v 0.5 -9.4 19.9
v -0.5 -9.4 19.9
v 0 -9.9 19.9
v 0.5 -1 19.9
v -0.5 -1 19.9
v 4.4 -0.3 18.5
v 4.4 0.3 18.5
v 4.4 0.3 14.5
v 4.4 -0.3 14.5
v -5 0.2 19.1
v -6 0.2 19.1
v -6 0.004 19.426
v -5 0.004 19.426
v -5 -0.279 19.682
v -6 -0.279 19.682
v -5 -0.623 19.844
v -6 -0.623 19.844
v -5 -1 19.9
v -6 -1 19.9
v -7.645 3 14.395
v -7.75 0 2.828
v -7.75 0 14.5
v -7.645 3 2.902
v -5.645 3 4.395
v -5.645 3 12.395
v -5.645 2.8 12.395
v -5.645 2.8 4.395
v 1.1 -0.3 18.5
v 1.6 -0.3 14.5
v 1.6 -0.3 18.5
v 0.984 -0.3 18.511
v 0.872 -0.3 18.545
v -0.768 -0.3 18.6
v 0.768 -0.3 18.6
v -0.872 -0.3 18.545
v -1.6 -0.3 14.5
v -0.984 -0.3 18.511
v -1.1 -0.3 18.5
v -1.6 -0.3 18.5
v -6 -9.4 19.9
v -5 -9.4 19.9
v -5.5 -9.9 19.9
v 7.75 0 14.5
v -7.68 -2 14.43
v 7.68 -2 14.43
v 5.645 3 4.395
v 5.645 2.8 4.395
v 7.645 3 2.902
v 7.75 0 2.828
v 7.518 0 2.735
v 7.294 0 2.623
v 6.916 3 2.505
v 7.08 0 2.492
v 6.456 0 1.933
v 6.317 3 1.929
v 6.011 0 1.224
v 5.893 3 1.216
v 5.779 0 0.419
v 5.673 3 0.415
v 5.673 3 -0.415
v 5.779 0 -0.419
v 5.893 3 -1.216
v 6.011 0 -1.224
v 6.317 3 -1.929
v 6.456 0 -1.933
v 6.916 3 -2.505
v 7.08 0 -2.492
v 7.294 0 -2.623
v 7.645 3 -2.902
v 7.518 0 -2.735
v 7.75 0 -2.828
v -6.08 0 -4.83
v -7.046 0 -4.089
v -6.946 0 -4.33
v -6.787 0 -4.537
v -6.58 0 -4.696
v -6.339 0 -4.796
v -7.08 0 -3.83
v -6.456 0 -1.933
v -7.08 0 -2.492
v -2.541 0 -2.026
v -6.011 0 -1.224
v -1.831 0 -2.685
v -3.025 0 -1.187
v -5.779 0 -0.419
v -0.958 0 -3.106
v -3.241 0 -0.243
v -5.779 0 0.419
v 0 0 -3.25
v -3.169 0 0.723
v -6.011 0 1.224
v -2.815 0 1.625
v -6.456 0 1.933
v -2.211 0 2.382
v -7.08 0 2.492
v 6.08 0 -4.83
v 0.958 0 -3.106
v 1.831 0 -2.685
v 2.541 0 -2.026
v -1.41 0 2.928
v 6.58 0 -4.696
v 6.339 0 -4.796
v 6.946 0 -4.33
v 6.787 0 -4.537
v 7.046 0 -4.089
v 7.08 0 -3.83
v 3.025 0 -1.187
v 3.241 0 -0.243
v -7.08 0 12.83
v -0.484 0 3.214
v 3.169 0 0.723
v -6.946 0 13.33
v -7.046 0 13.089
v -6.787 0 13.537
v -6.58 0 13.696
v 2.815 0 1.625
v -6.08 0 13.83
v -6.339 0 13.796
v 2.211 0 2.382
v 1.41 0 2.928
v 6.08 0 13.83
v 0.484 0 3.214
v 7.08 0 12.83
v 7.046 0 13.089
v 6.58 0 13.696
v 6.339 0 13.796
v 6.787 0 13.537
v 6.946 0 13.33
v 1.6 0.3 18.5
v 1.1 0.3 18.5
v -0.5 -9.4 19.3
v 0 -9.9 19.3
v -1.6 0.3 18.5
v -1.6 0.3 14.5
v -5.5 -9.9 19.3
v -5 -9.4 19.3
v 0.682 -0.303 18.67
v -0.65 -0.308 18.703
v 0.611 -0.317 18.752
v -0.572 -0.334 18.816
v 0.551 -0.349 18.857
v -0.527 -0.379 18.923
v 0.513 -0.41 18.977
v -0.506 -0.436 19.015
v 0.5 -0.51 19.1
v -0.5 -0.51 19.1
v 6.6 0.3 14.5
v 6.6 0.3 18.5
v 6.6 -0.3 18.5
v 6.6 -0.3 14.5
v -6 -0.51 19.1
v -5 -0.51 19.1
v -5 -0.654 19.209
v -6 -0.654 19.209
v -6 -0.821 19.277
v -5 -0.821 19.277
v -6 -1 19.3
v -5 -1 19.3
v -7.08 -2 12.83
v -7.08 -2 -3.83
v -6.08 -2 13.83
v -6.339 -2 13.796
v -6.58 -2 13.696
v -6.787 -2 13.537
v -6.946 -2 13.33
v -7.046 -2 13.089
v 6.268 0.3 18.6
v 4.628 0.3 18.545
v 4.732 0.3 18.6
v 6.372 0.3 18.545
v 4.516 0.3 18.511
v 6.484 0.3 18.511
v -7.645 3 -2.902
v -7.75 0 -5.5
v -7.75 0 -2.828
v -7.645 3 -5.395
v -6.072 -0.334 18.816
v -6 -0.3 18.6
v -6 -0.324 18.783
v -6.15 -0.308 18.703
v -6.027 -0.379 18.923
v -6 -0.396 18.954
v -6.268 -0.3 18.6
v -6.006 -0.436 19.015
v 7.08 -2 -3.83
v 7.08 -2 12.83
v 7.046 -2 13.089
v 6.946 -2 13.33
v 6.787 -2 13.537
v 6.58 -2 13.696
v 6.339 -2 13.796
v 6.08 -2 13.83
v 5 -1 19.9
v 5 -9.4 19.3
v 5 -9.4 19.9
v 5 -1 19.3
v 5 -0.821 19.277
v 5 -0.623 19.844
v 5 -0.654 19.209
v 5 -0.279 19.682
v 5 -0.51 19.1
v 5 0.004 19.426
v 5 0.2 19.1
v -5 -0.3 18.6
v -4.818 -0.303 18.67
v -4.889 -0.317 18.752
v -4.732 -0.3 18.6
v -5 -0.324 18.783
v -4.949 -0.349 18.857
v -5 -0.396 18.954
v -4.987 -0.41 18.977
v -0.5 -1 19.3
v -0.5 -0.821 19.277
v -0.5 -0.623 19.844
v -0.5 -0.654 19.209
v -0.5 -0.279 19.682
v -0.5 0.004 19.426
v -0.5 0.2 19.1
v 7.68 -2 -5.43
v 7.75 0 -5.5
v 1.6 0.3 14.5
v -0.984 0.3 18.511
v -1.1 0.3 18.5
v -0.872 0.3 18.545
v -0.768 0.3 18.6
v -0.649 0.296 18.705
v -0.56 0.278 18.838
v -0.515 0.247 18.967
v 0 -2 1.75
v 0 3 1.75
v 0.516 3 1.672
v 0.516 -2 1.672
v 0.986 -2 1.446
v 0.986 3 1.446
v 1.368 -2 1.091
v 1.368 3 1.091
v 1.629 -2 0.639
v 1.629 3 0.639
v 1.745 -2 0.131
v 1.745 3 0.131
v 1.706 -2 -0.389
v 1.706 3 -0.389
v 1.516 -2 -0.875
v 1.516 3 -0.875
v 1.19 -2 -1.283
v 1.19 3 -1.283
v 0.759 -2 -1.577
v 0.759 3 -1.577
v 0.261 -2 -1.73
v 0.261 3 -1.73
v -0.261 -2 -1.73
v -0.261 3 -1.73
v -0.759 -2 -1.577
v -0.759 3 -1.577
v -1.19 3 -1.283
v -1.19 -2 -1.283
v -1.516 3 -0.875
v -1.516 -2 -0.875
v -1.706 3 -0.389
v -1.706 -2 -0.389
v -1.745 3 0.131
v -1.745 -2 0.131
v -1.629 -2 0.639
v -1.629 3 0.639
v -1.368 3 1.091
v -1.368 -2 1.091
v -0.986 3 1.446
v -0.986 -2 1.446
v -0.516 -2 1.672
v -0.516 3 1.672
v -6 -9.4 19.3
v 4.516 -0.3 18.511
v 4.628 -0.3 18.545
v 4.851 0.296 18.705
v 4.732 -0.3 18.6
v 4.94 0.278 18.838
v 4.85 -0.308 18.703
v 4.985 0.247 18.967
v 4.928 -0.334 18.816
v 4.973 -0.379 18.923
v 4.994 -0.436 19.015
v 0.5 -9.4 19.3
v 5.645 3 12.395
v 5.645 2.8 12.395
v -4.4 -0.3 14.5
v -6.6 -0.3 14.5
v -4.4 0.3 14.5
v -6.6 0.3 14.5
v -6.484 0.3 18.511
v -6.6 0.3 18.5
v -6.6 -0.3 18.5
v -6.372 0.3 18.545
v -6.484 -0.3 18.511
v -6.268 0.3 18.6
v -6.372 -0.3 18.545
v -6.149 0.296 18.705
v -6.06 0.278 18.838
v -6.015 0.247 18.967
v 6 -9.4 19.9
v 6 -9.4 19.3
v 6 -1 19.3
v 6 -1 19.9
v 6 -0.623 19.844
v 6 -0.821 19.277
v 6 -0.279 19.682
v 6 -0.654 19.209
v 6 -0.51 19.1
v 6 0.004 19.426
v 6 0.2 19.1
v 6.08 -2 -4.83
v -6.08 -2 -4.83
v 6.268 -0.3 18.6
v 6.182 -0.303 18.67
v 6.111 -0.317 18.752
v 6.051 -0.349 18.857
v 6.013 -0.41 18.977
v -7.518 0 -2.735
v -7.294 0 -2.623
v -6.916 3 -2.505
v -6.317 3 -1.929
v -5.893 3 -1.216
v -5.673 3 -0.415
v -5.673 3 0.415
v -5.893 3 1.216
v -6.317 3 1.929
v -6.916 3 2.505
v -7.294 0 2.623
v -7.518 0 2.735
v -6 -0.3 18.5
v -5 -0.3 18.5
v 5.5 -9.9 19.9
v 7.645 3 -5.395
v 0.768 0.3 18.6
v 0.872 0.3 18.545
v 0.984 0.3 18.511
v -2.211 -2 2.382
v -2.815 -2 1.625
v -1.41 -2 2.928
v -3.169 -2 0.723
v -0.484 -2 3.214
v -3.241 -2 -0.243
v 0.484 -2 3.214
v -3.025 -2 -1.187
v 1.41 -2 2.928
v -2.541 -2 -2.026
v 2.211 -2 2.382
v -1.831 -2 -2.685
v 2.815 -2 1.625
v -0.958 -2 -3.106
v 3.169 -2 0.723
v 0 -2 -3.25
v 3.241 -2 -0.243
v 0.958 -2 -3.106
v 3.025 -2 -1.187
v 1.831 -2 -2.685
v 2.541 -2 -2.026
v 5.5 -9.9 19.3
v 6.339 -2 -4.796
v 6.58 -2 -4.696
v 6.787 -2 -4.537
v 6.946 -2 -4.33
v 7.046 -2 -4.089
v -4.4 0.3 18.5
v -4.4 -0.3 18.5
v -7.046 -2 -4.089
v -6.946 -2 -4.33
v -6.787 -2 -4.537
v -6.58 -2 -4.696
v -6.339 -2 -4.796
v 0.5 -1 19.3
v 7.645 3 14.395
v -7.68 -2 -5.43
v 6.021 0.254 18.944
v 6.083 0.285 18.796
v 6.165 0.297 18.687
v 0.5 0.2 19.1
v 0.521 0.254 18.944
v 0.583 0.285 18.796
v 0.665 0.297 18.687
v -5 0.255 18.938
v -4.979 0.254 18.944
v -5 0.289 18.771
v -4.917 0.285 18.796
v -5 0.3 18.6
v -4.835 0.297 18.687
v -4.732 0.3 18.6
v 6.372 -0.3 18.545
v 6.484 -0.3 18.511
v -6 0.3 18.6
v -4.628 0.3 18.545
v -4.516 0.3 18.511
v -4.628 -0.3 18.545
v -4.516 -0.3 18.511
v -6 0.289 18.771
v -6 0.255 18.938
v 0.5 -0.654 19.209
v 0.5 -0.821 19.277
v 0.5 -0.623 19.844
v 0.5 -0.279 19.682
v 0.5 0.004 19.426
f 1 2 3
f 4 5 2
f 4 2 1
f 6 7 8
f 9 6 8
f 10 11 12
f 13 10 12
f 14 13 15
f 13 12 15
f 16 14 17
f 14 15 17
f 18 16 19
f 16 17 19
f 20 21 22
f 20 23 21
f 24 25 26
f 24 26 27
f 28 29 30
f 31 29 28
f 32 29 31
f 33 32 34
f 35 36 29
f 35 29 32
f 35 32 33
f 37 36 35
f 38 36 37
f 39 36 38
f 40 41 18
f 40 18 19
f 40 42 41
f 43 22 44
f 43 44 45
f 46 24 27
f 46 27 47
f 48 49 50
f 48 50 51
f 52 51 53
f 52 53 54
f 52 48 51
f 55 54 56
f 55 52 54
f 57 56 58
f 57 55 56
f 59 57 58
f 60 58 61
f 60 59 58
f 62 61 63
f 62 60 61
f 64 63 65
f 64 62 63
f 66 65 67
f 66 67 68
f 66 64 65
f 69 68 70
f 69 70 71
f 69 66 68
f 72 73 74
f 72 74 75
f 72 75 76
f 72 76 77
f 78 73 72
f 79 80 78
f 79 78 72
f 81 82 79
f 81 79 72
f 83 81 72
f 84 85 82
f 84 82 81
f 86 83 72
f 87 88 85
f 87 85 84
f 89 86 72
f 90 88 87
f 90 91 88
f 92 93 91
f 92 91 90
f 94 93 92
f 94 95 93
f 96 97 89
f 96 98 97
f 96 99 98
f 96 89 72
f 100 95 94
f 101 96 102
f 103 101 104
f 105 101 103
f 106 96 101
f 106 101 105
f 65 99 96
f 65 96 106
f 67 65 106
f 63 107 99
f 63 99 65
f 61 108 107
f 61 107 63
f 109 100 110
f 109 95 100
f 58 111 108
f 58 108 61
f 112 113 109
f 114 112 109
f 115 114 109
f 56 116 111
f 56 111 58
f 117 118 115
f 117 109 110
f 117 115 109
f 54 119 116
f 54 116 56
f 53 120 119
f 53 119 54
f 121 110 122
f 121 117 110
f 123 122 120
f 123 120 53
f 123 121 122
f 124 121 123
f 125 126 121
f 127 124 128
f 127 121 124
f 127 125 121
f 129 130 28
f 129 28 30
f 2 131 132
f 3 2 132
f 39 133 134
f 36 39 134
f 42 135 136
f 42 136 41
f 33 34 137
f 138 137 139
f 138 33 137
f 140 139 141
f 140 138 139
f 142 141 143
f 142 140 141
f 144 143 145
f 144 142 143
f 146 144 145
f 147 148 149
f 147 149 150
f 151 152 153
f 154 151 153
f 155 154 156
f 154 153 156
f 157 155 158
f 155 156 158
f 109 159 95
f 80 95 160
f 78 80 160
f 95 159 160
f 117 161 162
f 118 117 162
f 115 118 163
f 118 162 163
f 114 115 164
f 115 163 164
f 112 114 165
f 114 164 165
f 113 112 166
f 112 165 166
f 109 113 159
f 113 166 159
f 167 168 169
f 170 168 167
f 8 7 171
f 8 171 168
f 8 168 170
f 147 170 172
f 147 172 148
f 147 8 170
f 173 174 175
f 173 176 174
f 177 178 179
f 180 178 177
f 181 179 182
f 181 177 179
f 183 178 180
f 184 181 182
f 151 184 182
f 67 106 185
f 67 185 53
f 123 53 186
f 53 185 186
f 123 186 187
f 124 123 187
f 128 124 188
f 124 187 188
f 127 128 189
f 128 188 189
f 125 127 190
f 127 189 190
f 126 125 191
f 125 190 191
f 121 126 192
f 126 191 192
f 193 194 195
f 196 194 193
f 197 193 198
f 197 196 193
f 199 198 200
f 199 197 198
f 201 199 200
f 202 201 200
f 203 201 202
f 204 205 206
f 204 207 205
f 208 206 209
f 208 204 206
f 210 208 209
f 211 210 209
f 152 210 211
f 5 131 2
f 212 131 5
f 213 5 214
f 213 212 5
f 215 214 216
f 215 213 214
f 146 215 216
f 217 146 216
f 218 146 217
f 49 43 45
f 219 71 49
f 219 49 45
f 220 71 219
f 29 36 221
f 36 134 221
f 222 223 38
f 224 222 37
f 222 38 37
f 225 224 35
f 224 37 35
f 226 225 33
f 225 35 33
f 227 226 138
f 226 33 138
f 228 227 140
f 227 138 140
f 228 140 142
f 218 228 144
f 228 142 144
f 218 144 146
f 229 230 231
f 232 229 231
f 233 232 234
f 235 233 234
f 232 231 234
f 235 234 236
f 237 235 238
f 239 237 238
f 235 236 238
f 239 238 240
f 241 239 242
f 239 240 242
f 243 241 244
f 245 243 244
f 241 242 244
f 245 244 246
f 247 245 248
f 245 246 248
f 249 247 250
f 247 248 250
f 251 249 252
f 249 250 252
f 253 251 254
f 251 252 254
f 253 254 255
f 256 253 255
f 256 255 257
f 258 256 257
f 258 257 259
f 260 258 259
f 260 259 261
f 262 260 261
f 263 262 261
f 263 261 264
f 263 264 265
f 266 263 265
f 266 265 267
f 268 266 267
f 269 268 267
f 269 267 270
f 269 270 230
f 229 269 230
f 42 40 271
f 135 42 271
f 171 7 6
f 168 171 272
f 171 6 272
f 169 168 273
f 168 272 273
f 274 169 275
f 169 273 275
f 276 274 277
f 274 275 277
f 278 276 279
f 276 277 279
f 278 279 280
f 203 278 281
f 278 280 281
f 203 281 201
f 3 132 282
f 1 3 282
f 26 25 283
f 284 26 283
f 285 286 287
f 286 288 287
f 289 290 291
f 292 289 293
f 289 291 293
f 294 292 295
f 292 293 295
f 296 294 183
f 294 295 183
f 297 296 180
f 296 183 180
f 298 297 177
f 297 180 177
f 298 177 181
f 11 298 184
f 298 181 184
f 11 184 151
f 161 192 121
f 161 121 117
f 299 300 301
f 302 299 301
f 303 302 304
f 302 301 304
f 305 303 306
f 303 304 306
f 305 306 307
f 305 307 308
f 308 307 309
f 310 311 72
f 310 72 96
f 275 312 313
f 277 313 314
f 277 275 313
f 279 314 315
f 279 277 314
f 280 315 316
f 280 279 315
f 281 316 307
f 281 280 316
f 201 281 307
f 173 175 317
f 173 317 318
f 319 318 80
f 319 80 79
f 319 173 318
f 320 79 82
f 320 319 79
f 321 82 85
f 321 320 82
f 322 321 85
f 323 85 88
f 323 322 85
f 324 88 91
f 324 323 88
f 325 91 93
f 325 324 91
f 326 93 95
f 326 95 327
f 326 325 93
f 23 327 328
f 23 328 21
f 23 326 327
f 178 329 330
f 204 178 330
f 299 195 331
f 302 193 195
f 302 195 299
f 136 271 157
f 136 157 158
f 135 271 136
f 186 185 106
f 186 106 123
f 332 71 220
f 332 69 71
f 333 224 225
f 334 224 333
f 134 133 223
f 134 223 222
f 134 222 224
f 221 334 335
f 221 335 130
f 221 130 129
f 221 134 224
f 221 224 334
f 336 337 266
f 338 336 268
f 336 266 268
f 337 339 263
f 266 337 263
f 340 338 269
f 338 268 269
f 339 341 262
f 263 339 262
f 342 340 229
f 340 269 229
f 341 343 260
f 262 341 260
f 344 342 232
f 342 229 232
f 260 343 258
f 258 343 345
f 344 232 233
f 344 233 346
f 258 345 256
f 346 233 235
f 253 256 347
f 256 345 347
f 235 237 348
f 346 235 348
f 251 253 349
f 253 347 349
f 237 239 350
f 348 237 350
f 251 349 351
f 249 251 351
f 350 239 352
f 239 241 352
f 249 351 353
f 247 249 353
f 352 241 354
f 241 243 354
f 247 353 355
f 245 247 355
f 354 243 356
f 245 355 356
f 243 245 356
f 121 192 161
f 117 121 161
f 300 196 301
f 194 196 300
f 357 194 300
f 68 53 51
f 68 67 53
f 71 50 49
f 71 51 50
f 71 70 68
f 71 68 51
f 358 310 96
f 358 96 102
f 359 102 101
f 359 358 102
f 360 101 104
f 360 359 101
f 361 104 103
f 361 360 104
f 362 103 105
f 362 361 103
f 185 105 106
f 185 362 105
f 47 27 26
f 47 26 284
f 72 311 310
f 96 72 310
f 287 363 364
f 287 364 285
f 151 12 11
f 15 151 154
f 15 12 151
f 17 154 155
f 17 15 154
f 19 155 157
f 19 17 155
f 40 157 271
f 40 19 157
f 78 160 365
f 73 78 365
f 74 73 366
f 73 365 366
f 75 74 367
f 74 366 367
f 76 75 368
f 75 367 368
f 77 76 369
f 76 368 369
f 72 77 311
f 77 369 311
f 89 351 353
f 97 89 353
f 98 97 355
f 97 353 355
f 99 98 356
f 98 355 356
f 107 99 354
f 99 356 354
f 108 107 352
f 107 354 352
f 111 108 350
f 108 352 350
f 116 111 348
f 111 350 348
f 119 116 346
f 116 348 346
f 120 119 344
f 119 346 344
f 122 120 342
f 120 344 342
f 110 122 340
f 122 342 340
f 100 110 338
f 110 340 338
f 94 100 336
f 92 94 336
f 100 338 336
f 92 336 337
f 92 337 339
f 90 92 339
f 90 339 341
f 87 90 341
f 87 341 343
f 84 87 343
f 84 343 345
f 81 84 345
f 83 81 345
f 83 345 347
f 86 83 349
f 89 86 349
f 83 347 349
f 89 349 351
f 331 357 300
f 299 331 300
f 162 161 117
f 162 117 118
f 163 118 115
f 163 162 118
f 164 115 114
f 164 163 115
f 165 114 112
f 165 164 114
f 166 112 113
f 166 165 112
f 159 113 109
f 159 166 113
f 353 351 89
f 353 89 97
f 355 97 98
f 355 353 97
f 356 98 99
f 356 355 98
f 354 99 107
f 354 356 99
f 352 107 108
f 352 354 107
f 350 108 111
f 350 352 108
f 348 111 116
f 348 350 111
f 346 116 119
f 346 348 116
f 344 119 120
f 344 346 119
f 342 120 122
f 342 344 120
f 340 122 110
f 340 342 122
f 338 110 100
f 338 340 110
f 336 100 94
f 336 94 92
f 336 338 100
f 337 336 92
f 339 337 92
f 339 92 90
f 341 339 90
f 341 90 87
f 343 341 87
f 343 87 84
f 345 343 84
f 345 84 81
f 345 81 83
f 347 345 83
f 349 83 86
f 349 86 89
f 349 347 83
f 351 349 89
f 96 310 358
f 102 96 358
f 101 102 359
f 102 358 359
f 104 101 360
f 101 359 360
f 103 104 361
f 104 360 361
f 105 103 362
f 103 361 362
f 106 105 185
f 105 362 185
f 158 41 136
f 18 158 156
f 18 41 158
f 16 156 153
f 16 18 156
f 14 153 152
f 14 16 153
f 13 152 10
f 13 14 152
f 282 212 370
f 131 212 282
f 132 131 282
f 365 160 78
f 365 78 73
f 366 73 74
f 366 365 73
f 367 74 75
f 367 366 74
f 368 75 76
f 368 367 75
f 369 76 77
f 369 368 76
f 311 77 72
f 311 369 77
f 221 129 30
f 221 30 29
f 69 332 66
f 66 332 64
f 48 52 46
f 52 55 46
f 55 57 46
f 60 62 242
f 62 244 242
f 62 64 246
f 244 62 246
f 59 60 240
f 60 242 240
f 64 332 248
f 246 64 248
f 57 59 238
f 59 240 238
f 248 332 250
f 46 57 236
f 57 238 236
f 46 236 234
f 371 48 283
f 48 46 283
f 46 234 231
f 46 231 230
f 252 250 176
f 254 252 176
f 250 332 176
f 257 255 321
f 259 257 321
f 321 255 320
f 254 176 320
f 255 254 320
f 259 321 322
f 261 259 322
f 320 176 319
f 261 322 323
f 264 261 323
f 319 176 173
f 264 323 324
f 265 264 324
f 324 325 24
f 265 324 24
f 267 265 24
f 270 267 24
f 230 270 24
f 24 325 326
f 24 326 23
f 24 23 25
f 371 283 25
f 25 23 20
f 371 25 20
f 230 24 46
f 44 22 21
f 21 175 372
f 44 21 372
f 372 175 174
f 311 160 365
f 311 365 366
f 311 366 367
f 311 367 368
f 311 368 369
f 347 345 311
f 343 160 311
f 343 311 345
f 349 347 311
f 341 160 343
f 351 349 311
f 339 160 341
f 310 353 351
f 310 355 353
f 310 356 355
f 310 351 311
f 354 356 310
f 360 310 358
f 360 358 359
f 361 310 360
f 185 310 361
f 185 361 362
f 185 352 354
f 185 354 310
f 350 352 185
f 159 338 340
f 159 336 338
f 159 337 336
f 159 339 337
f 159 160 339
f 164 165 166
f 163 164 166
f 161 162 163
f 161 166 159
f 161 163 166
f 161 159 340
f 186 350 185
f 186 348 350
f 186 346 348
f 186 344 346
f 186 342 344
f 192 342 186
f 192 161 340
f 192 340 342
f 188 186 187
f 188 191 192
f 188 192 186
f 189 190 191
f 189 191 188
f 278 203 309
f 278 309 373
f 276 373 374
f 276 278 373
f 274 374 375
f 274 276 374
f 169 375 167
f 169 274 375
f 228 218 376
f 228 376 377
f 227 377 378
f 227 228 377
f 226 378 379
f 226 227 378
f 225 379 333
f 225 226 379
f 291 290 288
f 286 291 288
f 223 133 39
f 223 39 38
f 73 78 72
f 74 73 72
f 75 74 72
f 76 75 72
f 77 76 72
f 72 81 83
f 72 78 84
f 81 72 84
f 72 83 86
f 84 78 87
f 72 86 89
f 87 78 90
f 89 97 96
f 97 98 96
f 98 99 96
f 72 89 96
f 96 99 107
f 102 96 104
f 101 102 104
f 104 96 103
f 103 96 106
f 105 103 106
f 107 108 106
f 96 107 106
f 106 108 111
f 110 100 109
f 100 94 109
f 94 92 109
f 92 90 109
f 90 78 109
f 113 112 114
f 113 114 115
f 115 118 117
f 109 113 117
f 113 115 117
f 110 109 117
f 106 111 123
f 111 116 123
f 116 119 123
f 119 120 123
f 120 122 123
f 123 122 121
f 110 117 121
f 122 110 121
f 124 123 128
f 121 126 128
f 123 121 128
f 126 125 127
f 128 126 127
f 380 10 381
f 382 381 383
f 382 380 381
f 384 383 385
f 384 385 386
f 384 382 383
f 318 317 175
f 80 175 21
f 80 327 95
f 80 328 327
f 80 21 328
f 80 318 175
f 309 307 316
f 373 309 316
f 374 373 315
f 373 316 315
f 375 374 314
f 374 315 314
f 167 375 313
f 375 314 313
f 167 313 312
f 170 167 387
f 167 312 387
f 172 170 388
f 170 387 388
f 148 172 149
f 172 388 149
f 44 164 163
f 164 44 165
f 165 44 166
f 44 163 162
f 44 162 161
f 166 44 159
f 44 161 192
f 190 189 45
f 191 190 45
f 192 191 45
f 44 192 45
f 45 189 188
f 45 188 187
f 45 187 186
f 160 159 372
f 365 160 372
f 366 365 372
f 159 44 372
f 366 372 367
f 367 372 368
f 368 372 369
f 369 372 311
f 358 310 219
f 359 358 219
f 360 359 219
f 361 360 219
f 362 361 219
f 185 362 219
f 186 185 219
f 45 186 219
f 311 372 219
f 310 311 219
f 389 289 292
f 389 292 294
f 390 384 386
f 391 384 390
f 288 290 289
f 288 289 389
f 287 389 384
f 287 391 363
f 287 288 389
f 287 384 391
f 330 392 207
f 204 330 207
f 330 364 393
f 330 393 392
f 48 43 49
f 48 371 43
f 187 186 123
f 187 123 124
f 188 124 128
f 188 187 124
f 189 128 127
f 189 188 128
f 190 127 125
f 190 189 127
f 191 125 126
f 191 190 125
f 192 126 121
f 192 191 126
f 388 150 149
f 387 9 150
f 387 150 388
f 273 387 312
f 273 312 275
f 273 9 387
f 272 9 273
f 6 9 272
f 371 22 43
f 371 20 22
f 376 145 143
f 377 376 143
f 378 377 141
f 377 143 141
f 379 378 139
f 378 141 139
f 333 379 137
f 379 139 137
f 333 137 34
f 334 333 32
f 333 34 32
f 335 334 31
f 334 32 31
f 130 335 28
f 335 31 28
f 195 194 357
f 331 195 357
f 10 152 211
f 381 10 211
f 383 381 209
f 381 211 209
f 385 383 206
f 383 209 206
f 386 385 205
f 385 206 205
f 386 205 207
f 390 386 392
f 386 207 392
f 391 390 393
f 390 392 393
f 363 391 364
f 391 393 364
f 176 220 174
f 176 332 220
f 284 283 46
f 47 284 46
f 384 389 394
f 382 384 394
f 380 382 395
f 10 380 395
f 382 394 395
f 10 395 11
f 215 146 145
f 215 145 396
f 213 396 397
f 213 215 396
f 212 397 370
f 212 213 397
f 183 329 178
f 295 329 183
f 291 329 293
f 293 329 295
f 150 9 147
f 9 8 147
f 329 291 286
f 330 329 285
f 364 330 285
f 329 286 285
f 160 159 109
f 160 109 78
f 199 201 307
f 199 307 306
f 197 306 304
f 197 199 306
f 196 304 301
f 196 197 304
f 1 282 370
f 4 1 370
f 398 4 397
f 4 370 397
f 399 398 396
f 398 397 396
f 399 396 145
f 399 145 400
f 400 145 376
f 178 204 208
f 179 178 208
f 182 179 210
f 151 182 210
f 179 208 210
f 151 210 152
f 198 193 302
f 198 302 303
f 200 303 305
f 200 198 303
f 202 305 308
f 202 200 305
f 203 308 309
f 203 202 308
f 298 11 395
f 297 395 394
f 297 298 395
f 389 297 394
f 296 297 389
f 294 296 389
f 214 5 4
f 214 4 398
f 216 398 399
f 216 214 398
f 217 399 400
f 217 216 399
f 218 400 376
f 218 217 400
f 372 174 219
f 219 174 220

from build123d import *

# Parameters (mm, degrees)
SKETCH1_W             = 15.5
SKETCH1_H             = 20
EXTRUDE1_DEPTH        = 2
EXTRUDE1_DRAFT        = -2
EXTRUDE2_DEPTH        = 3
EXTRUDE2_TAPER        = 2
SKETCH3_R             = 1.75
EXTRUDE3_DEPTH        = 18.184658986
SKETCH4_W             = 2.2
SKETCH4_H             = 4
EXTRUDE4_DEPTH        = 0.3
SKETCH4_W_2           = 3.2
EXTRUDE4_2_DEPTH      = 0.3
EXTRUDE4_3_DEPTH      = 0.3
SKETCH5_W             = 11.290475384
SKETCH5_H             = 8
EXTRUDE5_DEPTH        = 0.2
SKETCH6_W             = 1
SKETCH6_H             = 0.6
CHAMFER1_SIZE         = 0.5
LPATTERN1_START       = 18.6
LPATTERN1_DEPTH       = 1.3
LPATTERN1_START_2     = 18.5
LPATTERN1_2_OUTLINE_W = 1
LPATTERN1_2_OUTLINE_H = 0.6
LPATTERN1_2_DEPTH     = 0.8
LPATTERN1_START_3     = 5
LPATTERN1_3_DEPTH     = 1
LPATTERN1_4_DEPTH     = 1.3
LPATTERN1_5_OUTLINE_W = 1
LPATTERN1_5_OUTLINE_H = 0.6
LPATTERN1_5_DEPTH     = 0.8
LPATTERN1_START_4     = -0.5
LPATTERN1_6_DEPTH     = 1
FILLET1_START         = -0.510102151
FILLET1_DEPTH         = 0.810102151
FILLET1_START_2       = -8
FILLET1_2_DEPTH       = 5
FILLET2_START         = -0.510102151
FILLET2_DEPTH         = 0.810102151
FILLET2_START_2       = -2
FILLET2_2_DEPTH       = 4
FILLET3_START         = -0.510102151
FILLET3_DEPTH         = 0.810102151
FILLET3_START_2       = 3
FILLET3_2_DEPTH       = 5
SKETCH7_R             = 3.25
CUT_EXTRUDE1_DEPTH    = 2
SKETCH8_R             = 3.25
EXTRUDE7_DEPTH        = 2


with BuildPart() as part:
    # Sketch1 → Extrude1 (with draft: the straight prism first)
    with BuildSketch(Plane(origin=(0, 0, 0), x_dir=(1, 0, 0), z_dir=(0, 1, 0))):
        with Locations((0, -4.5)):
            Rectangle(SKETCH1_W, SKETCH1_H)
    extrude(amount=-EXTRUDE1_DEPTH)
    # Extrude1: the draft: its side faces are tilted about the plane it starts from
    extrude1_sides = [part.faces().sort_by_distance(p)[0] for p in [
        (7.75, -1, 4.5),
        (0, -1, -5.5),
        (-7.75, -1, 4.5),
        (0, -1, 14.5),
    ]]
    draft(extrude1_sides, Plane(origin=(0, 0, 0), x_dir=(1, 0, 0), z_dir=(0, 1, 0)), EXTRUDE1_DRAFT)

    # Sketch2 → Extrude2 (add)
    with BuildSketch(Plane(origin=(0, 0, 0), x_dir=(1, 0, 0), z_dir=(0, 1, 0))):
        with BuildLine():
            Line((-7.75, -2.828427125), (-7.75, -14.5))
            Line((-7.75, -14.5), (7.75, -14.5))
            Line((7.75, -14.5), (7.75, -2.828427125))
            ThreePointArc((7.75, -2.828427125), (5.75, 0), (7.75, 2.828427125))
            Line((7.75, 2.828427125), (7.75, 5.5))
            Line((7.75, 5.5), (-7.75, 5.5))
            Line((-7.75, 5.5), (-7.75, 2.828427125))
            ThreePointArc((-7.75, 2.828427125), (-5.75, 0), (-7.75, -2.828427125))
        make_face()
    extrude(amount=EXTRUDE2_DEPTH, taper=EXTRUDE2_TAPER)

    # Sketch3 → Extrude3 (cut, through all)
    with BuildSketch(Plane(origin=(0, 3, 0), x_dir=(1, 0, 0), z_dir=(0, 1, 0))):
        with Locations(Location((0, 0, 0), (0, 0, 270))):
            Circle(SKETCH3_R)
    extrude(amount=-EXTRUDE3_DEPTH, mode=Mode.SUBTRACT)

    # Sketch5 → Extrude5 (cut)
    with BuildSketch(Plane(origin=(0, 3, 0), x_dir=(1, 0, 0), z_dir=(0, 1, 0))):
        with Locations((0, -8.395237692)):
            Rectangle(SKETCH5_W, SKETCH5_H)
    extrude(amount=-EXTRUDE5_DEPTH, mode=Mode.SUBTRACT)

    # Sketch7 → Cut-Extrude1 (cut)
    with BuildSketch(Plane.XZ.offset(2)):
        with BuildLine():
            Line((-7.080158461, 12.830158461), (-7.080158461, -3.830158461))
            ThreePointArc((-7.080158461, -3.830158461), (-6.787265242, -4.537265242), (-6.080158461, -4.830158461))
            Line((-6.080158461, -4.830158461), (6.080158461, -4.830158461))
            ThreePointArc((6.080158461, -4.830158461), (6.787265242, -4.537265242), (7.080158461, -3.830158461))
            Line((7.080158461, -3.830158461), (7.080158461, 12.830158461))
            ThreePointArc((7.080158461, 12.830158461), (6.787265242, 13.537265242), (6.080158461, 13.830158461))
            Line((6.080158461, 13.830158461), (-6.080158461, 13.830158461))
            ThreePointArc((-6.080158461, 13.830158461), (-6.787265242, 13.537265242), (-7.080158461, 12.830158461))
        make_face()
        with Locations(Location((0, 0, 0), (0, 0, 270))):
            Circle(SKETCH7_R, mode=Mode.SUBTRACT)
    extrude(amount=-CUT_EXTRUDE1_DEPTH, mode=Mode.SUBTRACT)


with BuildPart() as body_2:
    # Sketch4 → Extrude4 (new, symmetric)
    with BuildSketch(Plane(origin=(0, 0, 0), x_dir=(1, 0, 0), z_dir=(0, 1, 0))):
        with Locations((-5.5, -16.5)):
            Rectangle(SKETCH4_W, SKETCH4_H)
    extrude(amount=EXTRUDE4_DEPTH, both=True)

    # Sweep1: sweep along a curve in space
    with BuildLine() as sweep1_path:
        Line((-5.5, 0, 18.5), (-5.5, 0, 18.6))
        ThreePointArc((-5.5, -1, 19.6), (-5.5, -0.292893219, 19.307106781), (-5.5, 0, 18.6))
        Line((-5.5, -9.9, 19.6), (-5.5, -1, 19.6))
    # Sketch6 → Sweep1 (sweep)
    with BuildSketch(Plane.XY.offset(18.5)):
        with Locations((-5.5, 0)):
            Rectangle(SKETCH6_W, SKETCH6_H)
    sweep(path=sweep1_path.line)

    # Chamfer1
    chamfer1_edges = [body_2.edges().sort_by_distance(p)[0] for p in [
        (-6, -9.9, 19.6),
        (-5, -9.9, 19.6),
    ]]
    chamfer(chamfer1_edges, length=CHAMFER1_SIZE - 0.0001)  # a hair under: the kernel refuses the full size

    # Fillet1: read off the stored shape, not the designer's step
    # Fillet1 outline → Fillet1 (add)
    with BuildSketch(Plane(origin=(0, 0, 0), x_dir=(1, 0, 0), z_dir=(0, 1, 0)).offset(FILLET1_START)):
        with BuildLine():
            Line((-5, -18.5), (-5, -19.1))
            ThreePointArc((-5, -19.1), (-4.824264069, -18.675735931), (-4.4, -18.5))
            Line((-4.4, -18.5), (-5, -18.5))
        make_face()
        with BuildLine():
            ThreePointArc((-6.6, -18.5), (-6.175735931, -18.675735931), (-6, -19.1))
            Line((-6, -19.1), (-6, -18.5))
            Line((-6, -18.5), (-6.6, -18.5))
        make_face()
    extrude(amount=FILLET1_DEPTH)

    # Fillet1 2 outline → Fillet1 2 (cut)
    with BuildSketch(Plane.YZ.offset(FILLET1_START_2)):
        with BuildLine():
            Line((-0.510102102, 19.10000005), (-0.510102151, 18.5))
            Line((-0.510102151, 18.5), (-0.3, 18.5))
            Line((-0.3, 18.5), (-0.3, 18.6))
            ThreePointArc((-0.3, 18.6), (-0.354659575, 18.871174733), (-0.510102102, 19.10000005))
        make_face()
        with BuildLine():
            Line((0.3, 19.1), (0.2, 19.1))
            ThreePointArc((0.2, 19.1), (0.274754878, 18.854950976), (0.3, 18.6))
            Line((0.3, 18.6), (0.3, 19.1))
        make_face()
    extrude(amount=FILLET1_2_DEPTH, mode=Mode.SUBTRACT)


with BuildPart() as body_3:
    # Sketch4 → Extrude4 2 (new, symmetric)
    with BuildSketch(Plane(origin=(0, 0, 0), x_dir=(1, 0, 0), z_dir=(0, 1, 0))):
        with Locations((0, -16.5)):
            Rectangle(SKETCH4_W_2, SKETCH4_H)
    extrude(amount=EXTRUDE4_2_DEPTH, both=True)

    # LPattern1 4 outline → LPattern1 4 (add)
    with BuildSketch(Plane.XY.offset(LPATTERN1_START)):
        Polygon((-0.5, -9.4), (0, -9.9), (0.5, -9.4), (0.5, 0.3), (-0.5, 0.3), align=None)
    extrude(amount=LPATTERN1_4_DEPTH)

    # LPattern1 5 outline → LPattern1 5 (add)
    with BuildSketch(Plane.XY.offset(LPATTERN1_START_2)):
        Rectangle(LPATTERN1_5_OUTLINE_W, LPATTERN1_5_OUTLINE_H)
    extrude(amount=LPATTERN1_5_DEPTH)

    # LPattern1 6 outline → LPattern1 6 (cut)
    with BuildSketch(Plane.YZ.offset(LPATTERN1_START_4)):
        with BuildLine():
            Line((-1, 19.3), (-11, 19.3))
            Line((-11, 19.3), (-11, 18.6))
            Line((-11, 18.6), (-0.3, 18.6))
            ThreePointArc((-0.3, 18.6), (-0.505025253, 19.094974747), (-1, 19.3))
        make_face()
        with BuildLine():
            Line((0.3, 19.9), (-1, 19.9))
            ThreePointArc((-1, 19.9), (-0.080761184, 19.519238816), (0.3, 18.6))
            Line((0.3, 18.6), (0.3, 19.9))
        make_face()
    extrude(amount=LPATTERN1_6_DEPTH, mode=Mode.SUBTRACT)

    # Fillet2: read off the stored shape, not the designer's step
    # Fillet2 outline → Fillet2 (add)
    with BuildSketch(Plane(origin=(0, 0, 0), x_dir=(1, 0, 0), z_dir=(0, 1, 0)).offset(FILLET2_START)):
        with BuildLine():
            ThreePointArc((-1.1, -18.5), (-0.675735931, -18.675735931), (-0.5, -19.1))
            Line((-0.5, -19.1), (-0.5, -18.5))
            Line((-0.5, -18.5), (-1.1, -18.5))
        make_face()
        with BuildLine():
            Line((0.5, -18.5), (0.5, -19.1))
            ThreePointArc((0.5, -19.1), (0.675735931, -18.675735931), (1.1, -18.5))
            Line((1.1, -18.5), (0.5, -18.5))
        make_face()
    extrude(amount=FILLET2_DEPTH)

    # Fillet2 2 outline → Fillet2 2 (cut)
    with BuildSketch(Plane.YZ.offset(FILLET2_START_2)):
        with BuildLine():
            Line((-0.510102102, 19.10000005), (-0.510102151, 18.5))
            Line((-0.510102151, 18.5), (-0.3, 18.5))
            Line((-0.3, 18.5), (-0.3, 18.6))
            ThreePointArc((-0.3, 18.6), (-0.354659575, 18.871174733), (-0.510102102, 19.10000005))
        make_face()
        with BuildLine():
            Line((0.3, 19.1), (0.2, 19.1))
            ThreePointArc((0.2, 19.1), (0.274754878, 18.854950976), (0.3, 18.6))
            Line((0.3, 18.6), (0.3, 19.1))
        make_face()
    extrude(amount=FILLET2_2_DEPTH, mode=Mode.SUBTRACT)


with BuildPart() as body_4:
    # Sketch4 → Extrude4 3 (new, symmetric)
    with BuildSketch(Plane(origin=(0, 0, 0), x_dir=(1, 0, 0), z_dir=(0, 1, 0))):
        with Locations((5.5, -16.5)):
            Rectangle(SKETCH4_W, SKETCH4_H)
    extrude(amount=EXTRUDE4_3_DEPTH, both=True)

    # LPattern1: read off the stored shape, not the designer's step
    # LPattern1 outline → LPattern1 (add)
    with BuildSketch(Plane.XY.offset(LPATTERN1_START)):
        Polygon((5, -9.4), (5.5, -9.9), (6, -9.4), (6, 0.3), (5, 0.3), align=None)
    extrude(amount=LPATTERN1_DEPTH)

    # LPattern1 2 outline → LPattern1 2 (add)
    with BuildSketch(Plane.XY.offset(LPATTERN1_START_2)):
        with Locations((5.5, 0)):
            Rectangle(LPATTERN1_2_OUTLINE_W, LPATTERN1_2_OUTLINE_H)
    extrude(amount=LPATTERN1_2_DEPTH)

    # LPattern1 3 outline → LPattern1 3 (cut)
    with BuildSketch(Plane.YZ.offset(LPATTERN1_START_3)):
        with BuildLine():
            Line((-1, 19.3), (-11, 19.3))
            Line((-11, 19.3), (-11, 18.6))
            Line((-11, 18.6), (-0.3, 18.6))
            ThreePointArc((-0.3, 18.6), (-0.505025253, 19.094974747), (-1, 19.3))
        make_face()
        with BuildLine():
            Line((0.3, 19.9), (-1, 19.9))
            ThreePointArc((-1, 19.9), (-0.080761184, 19.519238816), (0.3, 18.6))
            Line((0.3, 18.6), (0.3, 19.9))
        make_face()
    extrude(amount=LPATTERN1_3_DEPTH, mode=Mode.SUBTRACT)

    # Fillet3: read off the stored shape, not the designer's step
    # Fillet3 outline → Fillet3 (add)
    with BuildSketch(Plane(origin=(0, 0, 0), x_dir=(1, 0, 0), z_dir=(0, 1, 0)).offset(FILLET3_START)):
        with BuildLine():
            ThreePointArc((4.4, -18.5), (4.824264069, -18.675735931), (5, -19.1))
            Line((5, -19.1), (5, -18.5))
            Line((5, -18.5), (4.4, -18.5))
        make_face()
        with BuildLine():
            Line((6, -18.5), (6, -19.1))
            ThreePointArc((6, -19.1), (6.175735931, -18.675735931), (6.6, -18.5))
            Line((6.6, -18.5), (6, -18.5))
        make_face()
    extrude(amount=FILLET3_DEPTH)

    # Fillet3 2 outline → Fillet3 2 (cut)
    with BuildSketch(Plane.YZ.offset(FILLET3_START_2)):
        with BuildLine():
            Line((-0.510102102, 19.10000005), (-0.510102151, 18.5))
            Line((-0.510102151, 18.5), (-0.3, 18.5))
            Line((-0.3, 18.5), (-0.3, 18.6))
            ThreePointArc((-0.3, 18.6), (-0.354659575, 18.871174733), (-0.510102102, 19.10000005))
        make_face()
        with BuildLine():
            Line((0.3, 19.1), (0.2, 19.1))
            ThreePointArc((0.2, 19.1), (0.274754878, 18.854950976), (0.3, 18.6))
            Line((0.3, 18.6), (0.3, 19.1))
        make_face()
    extrude(amount=FILLET3_2_DEPTH, mode=Mode.SUBTRACT)


with BuildPart() as body_5:
    # Sketch8 → Extrude7 (new body)
    with BuildSketch(Plane.XZ.offset(2)):
        with BuildLine():
            Line((-7.080158461, 12.830158461), (-7.080158461, -3.830158461))
            ThreePointArc((-7.080158461, -3.830158461), (-6.787265242, -4.537265242), (-6.080158461, -4.830158461))
            Line((-6.080158461, -4.830158461), (6.080158461, -4.830158461))
            ThreePointArc((6.080158461, -4.830158461), (6.787265242, -4.537265242), (7.080158461, -3.830158461))
            Line((7.080158461, -3.830158461), (7.080158461, 12.830158461))
            ThreePointArc((7.080158461, 12.830158461), (6.787265242, 13.537265242), (6.080158461, 13.830158461))
            Line((6.080158461, 13.830158461), (-6.080158461, 13.830158461))
            ThreePointArc((-6.080158461, 13.830158461), (-6.787265242, 13.537265242), (-7.080158461, 12.830158461))
        make_face()
        with Locations(Location((0, 0, 0), (0, 0, 270))):
            Circle(SKETCH8_R, mode=Mode.SUBTRACT)
    extrude(amount=-EXTRUDE7_DEPTH)


solid = Compound([part.part, body_2.part, body_3.part, body_4.part, body_5.part])
